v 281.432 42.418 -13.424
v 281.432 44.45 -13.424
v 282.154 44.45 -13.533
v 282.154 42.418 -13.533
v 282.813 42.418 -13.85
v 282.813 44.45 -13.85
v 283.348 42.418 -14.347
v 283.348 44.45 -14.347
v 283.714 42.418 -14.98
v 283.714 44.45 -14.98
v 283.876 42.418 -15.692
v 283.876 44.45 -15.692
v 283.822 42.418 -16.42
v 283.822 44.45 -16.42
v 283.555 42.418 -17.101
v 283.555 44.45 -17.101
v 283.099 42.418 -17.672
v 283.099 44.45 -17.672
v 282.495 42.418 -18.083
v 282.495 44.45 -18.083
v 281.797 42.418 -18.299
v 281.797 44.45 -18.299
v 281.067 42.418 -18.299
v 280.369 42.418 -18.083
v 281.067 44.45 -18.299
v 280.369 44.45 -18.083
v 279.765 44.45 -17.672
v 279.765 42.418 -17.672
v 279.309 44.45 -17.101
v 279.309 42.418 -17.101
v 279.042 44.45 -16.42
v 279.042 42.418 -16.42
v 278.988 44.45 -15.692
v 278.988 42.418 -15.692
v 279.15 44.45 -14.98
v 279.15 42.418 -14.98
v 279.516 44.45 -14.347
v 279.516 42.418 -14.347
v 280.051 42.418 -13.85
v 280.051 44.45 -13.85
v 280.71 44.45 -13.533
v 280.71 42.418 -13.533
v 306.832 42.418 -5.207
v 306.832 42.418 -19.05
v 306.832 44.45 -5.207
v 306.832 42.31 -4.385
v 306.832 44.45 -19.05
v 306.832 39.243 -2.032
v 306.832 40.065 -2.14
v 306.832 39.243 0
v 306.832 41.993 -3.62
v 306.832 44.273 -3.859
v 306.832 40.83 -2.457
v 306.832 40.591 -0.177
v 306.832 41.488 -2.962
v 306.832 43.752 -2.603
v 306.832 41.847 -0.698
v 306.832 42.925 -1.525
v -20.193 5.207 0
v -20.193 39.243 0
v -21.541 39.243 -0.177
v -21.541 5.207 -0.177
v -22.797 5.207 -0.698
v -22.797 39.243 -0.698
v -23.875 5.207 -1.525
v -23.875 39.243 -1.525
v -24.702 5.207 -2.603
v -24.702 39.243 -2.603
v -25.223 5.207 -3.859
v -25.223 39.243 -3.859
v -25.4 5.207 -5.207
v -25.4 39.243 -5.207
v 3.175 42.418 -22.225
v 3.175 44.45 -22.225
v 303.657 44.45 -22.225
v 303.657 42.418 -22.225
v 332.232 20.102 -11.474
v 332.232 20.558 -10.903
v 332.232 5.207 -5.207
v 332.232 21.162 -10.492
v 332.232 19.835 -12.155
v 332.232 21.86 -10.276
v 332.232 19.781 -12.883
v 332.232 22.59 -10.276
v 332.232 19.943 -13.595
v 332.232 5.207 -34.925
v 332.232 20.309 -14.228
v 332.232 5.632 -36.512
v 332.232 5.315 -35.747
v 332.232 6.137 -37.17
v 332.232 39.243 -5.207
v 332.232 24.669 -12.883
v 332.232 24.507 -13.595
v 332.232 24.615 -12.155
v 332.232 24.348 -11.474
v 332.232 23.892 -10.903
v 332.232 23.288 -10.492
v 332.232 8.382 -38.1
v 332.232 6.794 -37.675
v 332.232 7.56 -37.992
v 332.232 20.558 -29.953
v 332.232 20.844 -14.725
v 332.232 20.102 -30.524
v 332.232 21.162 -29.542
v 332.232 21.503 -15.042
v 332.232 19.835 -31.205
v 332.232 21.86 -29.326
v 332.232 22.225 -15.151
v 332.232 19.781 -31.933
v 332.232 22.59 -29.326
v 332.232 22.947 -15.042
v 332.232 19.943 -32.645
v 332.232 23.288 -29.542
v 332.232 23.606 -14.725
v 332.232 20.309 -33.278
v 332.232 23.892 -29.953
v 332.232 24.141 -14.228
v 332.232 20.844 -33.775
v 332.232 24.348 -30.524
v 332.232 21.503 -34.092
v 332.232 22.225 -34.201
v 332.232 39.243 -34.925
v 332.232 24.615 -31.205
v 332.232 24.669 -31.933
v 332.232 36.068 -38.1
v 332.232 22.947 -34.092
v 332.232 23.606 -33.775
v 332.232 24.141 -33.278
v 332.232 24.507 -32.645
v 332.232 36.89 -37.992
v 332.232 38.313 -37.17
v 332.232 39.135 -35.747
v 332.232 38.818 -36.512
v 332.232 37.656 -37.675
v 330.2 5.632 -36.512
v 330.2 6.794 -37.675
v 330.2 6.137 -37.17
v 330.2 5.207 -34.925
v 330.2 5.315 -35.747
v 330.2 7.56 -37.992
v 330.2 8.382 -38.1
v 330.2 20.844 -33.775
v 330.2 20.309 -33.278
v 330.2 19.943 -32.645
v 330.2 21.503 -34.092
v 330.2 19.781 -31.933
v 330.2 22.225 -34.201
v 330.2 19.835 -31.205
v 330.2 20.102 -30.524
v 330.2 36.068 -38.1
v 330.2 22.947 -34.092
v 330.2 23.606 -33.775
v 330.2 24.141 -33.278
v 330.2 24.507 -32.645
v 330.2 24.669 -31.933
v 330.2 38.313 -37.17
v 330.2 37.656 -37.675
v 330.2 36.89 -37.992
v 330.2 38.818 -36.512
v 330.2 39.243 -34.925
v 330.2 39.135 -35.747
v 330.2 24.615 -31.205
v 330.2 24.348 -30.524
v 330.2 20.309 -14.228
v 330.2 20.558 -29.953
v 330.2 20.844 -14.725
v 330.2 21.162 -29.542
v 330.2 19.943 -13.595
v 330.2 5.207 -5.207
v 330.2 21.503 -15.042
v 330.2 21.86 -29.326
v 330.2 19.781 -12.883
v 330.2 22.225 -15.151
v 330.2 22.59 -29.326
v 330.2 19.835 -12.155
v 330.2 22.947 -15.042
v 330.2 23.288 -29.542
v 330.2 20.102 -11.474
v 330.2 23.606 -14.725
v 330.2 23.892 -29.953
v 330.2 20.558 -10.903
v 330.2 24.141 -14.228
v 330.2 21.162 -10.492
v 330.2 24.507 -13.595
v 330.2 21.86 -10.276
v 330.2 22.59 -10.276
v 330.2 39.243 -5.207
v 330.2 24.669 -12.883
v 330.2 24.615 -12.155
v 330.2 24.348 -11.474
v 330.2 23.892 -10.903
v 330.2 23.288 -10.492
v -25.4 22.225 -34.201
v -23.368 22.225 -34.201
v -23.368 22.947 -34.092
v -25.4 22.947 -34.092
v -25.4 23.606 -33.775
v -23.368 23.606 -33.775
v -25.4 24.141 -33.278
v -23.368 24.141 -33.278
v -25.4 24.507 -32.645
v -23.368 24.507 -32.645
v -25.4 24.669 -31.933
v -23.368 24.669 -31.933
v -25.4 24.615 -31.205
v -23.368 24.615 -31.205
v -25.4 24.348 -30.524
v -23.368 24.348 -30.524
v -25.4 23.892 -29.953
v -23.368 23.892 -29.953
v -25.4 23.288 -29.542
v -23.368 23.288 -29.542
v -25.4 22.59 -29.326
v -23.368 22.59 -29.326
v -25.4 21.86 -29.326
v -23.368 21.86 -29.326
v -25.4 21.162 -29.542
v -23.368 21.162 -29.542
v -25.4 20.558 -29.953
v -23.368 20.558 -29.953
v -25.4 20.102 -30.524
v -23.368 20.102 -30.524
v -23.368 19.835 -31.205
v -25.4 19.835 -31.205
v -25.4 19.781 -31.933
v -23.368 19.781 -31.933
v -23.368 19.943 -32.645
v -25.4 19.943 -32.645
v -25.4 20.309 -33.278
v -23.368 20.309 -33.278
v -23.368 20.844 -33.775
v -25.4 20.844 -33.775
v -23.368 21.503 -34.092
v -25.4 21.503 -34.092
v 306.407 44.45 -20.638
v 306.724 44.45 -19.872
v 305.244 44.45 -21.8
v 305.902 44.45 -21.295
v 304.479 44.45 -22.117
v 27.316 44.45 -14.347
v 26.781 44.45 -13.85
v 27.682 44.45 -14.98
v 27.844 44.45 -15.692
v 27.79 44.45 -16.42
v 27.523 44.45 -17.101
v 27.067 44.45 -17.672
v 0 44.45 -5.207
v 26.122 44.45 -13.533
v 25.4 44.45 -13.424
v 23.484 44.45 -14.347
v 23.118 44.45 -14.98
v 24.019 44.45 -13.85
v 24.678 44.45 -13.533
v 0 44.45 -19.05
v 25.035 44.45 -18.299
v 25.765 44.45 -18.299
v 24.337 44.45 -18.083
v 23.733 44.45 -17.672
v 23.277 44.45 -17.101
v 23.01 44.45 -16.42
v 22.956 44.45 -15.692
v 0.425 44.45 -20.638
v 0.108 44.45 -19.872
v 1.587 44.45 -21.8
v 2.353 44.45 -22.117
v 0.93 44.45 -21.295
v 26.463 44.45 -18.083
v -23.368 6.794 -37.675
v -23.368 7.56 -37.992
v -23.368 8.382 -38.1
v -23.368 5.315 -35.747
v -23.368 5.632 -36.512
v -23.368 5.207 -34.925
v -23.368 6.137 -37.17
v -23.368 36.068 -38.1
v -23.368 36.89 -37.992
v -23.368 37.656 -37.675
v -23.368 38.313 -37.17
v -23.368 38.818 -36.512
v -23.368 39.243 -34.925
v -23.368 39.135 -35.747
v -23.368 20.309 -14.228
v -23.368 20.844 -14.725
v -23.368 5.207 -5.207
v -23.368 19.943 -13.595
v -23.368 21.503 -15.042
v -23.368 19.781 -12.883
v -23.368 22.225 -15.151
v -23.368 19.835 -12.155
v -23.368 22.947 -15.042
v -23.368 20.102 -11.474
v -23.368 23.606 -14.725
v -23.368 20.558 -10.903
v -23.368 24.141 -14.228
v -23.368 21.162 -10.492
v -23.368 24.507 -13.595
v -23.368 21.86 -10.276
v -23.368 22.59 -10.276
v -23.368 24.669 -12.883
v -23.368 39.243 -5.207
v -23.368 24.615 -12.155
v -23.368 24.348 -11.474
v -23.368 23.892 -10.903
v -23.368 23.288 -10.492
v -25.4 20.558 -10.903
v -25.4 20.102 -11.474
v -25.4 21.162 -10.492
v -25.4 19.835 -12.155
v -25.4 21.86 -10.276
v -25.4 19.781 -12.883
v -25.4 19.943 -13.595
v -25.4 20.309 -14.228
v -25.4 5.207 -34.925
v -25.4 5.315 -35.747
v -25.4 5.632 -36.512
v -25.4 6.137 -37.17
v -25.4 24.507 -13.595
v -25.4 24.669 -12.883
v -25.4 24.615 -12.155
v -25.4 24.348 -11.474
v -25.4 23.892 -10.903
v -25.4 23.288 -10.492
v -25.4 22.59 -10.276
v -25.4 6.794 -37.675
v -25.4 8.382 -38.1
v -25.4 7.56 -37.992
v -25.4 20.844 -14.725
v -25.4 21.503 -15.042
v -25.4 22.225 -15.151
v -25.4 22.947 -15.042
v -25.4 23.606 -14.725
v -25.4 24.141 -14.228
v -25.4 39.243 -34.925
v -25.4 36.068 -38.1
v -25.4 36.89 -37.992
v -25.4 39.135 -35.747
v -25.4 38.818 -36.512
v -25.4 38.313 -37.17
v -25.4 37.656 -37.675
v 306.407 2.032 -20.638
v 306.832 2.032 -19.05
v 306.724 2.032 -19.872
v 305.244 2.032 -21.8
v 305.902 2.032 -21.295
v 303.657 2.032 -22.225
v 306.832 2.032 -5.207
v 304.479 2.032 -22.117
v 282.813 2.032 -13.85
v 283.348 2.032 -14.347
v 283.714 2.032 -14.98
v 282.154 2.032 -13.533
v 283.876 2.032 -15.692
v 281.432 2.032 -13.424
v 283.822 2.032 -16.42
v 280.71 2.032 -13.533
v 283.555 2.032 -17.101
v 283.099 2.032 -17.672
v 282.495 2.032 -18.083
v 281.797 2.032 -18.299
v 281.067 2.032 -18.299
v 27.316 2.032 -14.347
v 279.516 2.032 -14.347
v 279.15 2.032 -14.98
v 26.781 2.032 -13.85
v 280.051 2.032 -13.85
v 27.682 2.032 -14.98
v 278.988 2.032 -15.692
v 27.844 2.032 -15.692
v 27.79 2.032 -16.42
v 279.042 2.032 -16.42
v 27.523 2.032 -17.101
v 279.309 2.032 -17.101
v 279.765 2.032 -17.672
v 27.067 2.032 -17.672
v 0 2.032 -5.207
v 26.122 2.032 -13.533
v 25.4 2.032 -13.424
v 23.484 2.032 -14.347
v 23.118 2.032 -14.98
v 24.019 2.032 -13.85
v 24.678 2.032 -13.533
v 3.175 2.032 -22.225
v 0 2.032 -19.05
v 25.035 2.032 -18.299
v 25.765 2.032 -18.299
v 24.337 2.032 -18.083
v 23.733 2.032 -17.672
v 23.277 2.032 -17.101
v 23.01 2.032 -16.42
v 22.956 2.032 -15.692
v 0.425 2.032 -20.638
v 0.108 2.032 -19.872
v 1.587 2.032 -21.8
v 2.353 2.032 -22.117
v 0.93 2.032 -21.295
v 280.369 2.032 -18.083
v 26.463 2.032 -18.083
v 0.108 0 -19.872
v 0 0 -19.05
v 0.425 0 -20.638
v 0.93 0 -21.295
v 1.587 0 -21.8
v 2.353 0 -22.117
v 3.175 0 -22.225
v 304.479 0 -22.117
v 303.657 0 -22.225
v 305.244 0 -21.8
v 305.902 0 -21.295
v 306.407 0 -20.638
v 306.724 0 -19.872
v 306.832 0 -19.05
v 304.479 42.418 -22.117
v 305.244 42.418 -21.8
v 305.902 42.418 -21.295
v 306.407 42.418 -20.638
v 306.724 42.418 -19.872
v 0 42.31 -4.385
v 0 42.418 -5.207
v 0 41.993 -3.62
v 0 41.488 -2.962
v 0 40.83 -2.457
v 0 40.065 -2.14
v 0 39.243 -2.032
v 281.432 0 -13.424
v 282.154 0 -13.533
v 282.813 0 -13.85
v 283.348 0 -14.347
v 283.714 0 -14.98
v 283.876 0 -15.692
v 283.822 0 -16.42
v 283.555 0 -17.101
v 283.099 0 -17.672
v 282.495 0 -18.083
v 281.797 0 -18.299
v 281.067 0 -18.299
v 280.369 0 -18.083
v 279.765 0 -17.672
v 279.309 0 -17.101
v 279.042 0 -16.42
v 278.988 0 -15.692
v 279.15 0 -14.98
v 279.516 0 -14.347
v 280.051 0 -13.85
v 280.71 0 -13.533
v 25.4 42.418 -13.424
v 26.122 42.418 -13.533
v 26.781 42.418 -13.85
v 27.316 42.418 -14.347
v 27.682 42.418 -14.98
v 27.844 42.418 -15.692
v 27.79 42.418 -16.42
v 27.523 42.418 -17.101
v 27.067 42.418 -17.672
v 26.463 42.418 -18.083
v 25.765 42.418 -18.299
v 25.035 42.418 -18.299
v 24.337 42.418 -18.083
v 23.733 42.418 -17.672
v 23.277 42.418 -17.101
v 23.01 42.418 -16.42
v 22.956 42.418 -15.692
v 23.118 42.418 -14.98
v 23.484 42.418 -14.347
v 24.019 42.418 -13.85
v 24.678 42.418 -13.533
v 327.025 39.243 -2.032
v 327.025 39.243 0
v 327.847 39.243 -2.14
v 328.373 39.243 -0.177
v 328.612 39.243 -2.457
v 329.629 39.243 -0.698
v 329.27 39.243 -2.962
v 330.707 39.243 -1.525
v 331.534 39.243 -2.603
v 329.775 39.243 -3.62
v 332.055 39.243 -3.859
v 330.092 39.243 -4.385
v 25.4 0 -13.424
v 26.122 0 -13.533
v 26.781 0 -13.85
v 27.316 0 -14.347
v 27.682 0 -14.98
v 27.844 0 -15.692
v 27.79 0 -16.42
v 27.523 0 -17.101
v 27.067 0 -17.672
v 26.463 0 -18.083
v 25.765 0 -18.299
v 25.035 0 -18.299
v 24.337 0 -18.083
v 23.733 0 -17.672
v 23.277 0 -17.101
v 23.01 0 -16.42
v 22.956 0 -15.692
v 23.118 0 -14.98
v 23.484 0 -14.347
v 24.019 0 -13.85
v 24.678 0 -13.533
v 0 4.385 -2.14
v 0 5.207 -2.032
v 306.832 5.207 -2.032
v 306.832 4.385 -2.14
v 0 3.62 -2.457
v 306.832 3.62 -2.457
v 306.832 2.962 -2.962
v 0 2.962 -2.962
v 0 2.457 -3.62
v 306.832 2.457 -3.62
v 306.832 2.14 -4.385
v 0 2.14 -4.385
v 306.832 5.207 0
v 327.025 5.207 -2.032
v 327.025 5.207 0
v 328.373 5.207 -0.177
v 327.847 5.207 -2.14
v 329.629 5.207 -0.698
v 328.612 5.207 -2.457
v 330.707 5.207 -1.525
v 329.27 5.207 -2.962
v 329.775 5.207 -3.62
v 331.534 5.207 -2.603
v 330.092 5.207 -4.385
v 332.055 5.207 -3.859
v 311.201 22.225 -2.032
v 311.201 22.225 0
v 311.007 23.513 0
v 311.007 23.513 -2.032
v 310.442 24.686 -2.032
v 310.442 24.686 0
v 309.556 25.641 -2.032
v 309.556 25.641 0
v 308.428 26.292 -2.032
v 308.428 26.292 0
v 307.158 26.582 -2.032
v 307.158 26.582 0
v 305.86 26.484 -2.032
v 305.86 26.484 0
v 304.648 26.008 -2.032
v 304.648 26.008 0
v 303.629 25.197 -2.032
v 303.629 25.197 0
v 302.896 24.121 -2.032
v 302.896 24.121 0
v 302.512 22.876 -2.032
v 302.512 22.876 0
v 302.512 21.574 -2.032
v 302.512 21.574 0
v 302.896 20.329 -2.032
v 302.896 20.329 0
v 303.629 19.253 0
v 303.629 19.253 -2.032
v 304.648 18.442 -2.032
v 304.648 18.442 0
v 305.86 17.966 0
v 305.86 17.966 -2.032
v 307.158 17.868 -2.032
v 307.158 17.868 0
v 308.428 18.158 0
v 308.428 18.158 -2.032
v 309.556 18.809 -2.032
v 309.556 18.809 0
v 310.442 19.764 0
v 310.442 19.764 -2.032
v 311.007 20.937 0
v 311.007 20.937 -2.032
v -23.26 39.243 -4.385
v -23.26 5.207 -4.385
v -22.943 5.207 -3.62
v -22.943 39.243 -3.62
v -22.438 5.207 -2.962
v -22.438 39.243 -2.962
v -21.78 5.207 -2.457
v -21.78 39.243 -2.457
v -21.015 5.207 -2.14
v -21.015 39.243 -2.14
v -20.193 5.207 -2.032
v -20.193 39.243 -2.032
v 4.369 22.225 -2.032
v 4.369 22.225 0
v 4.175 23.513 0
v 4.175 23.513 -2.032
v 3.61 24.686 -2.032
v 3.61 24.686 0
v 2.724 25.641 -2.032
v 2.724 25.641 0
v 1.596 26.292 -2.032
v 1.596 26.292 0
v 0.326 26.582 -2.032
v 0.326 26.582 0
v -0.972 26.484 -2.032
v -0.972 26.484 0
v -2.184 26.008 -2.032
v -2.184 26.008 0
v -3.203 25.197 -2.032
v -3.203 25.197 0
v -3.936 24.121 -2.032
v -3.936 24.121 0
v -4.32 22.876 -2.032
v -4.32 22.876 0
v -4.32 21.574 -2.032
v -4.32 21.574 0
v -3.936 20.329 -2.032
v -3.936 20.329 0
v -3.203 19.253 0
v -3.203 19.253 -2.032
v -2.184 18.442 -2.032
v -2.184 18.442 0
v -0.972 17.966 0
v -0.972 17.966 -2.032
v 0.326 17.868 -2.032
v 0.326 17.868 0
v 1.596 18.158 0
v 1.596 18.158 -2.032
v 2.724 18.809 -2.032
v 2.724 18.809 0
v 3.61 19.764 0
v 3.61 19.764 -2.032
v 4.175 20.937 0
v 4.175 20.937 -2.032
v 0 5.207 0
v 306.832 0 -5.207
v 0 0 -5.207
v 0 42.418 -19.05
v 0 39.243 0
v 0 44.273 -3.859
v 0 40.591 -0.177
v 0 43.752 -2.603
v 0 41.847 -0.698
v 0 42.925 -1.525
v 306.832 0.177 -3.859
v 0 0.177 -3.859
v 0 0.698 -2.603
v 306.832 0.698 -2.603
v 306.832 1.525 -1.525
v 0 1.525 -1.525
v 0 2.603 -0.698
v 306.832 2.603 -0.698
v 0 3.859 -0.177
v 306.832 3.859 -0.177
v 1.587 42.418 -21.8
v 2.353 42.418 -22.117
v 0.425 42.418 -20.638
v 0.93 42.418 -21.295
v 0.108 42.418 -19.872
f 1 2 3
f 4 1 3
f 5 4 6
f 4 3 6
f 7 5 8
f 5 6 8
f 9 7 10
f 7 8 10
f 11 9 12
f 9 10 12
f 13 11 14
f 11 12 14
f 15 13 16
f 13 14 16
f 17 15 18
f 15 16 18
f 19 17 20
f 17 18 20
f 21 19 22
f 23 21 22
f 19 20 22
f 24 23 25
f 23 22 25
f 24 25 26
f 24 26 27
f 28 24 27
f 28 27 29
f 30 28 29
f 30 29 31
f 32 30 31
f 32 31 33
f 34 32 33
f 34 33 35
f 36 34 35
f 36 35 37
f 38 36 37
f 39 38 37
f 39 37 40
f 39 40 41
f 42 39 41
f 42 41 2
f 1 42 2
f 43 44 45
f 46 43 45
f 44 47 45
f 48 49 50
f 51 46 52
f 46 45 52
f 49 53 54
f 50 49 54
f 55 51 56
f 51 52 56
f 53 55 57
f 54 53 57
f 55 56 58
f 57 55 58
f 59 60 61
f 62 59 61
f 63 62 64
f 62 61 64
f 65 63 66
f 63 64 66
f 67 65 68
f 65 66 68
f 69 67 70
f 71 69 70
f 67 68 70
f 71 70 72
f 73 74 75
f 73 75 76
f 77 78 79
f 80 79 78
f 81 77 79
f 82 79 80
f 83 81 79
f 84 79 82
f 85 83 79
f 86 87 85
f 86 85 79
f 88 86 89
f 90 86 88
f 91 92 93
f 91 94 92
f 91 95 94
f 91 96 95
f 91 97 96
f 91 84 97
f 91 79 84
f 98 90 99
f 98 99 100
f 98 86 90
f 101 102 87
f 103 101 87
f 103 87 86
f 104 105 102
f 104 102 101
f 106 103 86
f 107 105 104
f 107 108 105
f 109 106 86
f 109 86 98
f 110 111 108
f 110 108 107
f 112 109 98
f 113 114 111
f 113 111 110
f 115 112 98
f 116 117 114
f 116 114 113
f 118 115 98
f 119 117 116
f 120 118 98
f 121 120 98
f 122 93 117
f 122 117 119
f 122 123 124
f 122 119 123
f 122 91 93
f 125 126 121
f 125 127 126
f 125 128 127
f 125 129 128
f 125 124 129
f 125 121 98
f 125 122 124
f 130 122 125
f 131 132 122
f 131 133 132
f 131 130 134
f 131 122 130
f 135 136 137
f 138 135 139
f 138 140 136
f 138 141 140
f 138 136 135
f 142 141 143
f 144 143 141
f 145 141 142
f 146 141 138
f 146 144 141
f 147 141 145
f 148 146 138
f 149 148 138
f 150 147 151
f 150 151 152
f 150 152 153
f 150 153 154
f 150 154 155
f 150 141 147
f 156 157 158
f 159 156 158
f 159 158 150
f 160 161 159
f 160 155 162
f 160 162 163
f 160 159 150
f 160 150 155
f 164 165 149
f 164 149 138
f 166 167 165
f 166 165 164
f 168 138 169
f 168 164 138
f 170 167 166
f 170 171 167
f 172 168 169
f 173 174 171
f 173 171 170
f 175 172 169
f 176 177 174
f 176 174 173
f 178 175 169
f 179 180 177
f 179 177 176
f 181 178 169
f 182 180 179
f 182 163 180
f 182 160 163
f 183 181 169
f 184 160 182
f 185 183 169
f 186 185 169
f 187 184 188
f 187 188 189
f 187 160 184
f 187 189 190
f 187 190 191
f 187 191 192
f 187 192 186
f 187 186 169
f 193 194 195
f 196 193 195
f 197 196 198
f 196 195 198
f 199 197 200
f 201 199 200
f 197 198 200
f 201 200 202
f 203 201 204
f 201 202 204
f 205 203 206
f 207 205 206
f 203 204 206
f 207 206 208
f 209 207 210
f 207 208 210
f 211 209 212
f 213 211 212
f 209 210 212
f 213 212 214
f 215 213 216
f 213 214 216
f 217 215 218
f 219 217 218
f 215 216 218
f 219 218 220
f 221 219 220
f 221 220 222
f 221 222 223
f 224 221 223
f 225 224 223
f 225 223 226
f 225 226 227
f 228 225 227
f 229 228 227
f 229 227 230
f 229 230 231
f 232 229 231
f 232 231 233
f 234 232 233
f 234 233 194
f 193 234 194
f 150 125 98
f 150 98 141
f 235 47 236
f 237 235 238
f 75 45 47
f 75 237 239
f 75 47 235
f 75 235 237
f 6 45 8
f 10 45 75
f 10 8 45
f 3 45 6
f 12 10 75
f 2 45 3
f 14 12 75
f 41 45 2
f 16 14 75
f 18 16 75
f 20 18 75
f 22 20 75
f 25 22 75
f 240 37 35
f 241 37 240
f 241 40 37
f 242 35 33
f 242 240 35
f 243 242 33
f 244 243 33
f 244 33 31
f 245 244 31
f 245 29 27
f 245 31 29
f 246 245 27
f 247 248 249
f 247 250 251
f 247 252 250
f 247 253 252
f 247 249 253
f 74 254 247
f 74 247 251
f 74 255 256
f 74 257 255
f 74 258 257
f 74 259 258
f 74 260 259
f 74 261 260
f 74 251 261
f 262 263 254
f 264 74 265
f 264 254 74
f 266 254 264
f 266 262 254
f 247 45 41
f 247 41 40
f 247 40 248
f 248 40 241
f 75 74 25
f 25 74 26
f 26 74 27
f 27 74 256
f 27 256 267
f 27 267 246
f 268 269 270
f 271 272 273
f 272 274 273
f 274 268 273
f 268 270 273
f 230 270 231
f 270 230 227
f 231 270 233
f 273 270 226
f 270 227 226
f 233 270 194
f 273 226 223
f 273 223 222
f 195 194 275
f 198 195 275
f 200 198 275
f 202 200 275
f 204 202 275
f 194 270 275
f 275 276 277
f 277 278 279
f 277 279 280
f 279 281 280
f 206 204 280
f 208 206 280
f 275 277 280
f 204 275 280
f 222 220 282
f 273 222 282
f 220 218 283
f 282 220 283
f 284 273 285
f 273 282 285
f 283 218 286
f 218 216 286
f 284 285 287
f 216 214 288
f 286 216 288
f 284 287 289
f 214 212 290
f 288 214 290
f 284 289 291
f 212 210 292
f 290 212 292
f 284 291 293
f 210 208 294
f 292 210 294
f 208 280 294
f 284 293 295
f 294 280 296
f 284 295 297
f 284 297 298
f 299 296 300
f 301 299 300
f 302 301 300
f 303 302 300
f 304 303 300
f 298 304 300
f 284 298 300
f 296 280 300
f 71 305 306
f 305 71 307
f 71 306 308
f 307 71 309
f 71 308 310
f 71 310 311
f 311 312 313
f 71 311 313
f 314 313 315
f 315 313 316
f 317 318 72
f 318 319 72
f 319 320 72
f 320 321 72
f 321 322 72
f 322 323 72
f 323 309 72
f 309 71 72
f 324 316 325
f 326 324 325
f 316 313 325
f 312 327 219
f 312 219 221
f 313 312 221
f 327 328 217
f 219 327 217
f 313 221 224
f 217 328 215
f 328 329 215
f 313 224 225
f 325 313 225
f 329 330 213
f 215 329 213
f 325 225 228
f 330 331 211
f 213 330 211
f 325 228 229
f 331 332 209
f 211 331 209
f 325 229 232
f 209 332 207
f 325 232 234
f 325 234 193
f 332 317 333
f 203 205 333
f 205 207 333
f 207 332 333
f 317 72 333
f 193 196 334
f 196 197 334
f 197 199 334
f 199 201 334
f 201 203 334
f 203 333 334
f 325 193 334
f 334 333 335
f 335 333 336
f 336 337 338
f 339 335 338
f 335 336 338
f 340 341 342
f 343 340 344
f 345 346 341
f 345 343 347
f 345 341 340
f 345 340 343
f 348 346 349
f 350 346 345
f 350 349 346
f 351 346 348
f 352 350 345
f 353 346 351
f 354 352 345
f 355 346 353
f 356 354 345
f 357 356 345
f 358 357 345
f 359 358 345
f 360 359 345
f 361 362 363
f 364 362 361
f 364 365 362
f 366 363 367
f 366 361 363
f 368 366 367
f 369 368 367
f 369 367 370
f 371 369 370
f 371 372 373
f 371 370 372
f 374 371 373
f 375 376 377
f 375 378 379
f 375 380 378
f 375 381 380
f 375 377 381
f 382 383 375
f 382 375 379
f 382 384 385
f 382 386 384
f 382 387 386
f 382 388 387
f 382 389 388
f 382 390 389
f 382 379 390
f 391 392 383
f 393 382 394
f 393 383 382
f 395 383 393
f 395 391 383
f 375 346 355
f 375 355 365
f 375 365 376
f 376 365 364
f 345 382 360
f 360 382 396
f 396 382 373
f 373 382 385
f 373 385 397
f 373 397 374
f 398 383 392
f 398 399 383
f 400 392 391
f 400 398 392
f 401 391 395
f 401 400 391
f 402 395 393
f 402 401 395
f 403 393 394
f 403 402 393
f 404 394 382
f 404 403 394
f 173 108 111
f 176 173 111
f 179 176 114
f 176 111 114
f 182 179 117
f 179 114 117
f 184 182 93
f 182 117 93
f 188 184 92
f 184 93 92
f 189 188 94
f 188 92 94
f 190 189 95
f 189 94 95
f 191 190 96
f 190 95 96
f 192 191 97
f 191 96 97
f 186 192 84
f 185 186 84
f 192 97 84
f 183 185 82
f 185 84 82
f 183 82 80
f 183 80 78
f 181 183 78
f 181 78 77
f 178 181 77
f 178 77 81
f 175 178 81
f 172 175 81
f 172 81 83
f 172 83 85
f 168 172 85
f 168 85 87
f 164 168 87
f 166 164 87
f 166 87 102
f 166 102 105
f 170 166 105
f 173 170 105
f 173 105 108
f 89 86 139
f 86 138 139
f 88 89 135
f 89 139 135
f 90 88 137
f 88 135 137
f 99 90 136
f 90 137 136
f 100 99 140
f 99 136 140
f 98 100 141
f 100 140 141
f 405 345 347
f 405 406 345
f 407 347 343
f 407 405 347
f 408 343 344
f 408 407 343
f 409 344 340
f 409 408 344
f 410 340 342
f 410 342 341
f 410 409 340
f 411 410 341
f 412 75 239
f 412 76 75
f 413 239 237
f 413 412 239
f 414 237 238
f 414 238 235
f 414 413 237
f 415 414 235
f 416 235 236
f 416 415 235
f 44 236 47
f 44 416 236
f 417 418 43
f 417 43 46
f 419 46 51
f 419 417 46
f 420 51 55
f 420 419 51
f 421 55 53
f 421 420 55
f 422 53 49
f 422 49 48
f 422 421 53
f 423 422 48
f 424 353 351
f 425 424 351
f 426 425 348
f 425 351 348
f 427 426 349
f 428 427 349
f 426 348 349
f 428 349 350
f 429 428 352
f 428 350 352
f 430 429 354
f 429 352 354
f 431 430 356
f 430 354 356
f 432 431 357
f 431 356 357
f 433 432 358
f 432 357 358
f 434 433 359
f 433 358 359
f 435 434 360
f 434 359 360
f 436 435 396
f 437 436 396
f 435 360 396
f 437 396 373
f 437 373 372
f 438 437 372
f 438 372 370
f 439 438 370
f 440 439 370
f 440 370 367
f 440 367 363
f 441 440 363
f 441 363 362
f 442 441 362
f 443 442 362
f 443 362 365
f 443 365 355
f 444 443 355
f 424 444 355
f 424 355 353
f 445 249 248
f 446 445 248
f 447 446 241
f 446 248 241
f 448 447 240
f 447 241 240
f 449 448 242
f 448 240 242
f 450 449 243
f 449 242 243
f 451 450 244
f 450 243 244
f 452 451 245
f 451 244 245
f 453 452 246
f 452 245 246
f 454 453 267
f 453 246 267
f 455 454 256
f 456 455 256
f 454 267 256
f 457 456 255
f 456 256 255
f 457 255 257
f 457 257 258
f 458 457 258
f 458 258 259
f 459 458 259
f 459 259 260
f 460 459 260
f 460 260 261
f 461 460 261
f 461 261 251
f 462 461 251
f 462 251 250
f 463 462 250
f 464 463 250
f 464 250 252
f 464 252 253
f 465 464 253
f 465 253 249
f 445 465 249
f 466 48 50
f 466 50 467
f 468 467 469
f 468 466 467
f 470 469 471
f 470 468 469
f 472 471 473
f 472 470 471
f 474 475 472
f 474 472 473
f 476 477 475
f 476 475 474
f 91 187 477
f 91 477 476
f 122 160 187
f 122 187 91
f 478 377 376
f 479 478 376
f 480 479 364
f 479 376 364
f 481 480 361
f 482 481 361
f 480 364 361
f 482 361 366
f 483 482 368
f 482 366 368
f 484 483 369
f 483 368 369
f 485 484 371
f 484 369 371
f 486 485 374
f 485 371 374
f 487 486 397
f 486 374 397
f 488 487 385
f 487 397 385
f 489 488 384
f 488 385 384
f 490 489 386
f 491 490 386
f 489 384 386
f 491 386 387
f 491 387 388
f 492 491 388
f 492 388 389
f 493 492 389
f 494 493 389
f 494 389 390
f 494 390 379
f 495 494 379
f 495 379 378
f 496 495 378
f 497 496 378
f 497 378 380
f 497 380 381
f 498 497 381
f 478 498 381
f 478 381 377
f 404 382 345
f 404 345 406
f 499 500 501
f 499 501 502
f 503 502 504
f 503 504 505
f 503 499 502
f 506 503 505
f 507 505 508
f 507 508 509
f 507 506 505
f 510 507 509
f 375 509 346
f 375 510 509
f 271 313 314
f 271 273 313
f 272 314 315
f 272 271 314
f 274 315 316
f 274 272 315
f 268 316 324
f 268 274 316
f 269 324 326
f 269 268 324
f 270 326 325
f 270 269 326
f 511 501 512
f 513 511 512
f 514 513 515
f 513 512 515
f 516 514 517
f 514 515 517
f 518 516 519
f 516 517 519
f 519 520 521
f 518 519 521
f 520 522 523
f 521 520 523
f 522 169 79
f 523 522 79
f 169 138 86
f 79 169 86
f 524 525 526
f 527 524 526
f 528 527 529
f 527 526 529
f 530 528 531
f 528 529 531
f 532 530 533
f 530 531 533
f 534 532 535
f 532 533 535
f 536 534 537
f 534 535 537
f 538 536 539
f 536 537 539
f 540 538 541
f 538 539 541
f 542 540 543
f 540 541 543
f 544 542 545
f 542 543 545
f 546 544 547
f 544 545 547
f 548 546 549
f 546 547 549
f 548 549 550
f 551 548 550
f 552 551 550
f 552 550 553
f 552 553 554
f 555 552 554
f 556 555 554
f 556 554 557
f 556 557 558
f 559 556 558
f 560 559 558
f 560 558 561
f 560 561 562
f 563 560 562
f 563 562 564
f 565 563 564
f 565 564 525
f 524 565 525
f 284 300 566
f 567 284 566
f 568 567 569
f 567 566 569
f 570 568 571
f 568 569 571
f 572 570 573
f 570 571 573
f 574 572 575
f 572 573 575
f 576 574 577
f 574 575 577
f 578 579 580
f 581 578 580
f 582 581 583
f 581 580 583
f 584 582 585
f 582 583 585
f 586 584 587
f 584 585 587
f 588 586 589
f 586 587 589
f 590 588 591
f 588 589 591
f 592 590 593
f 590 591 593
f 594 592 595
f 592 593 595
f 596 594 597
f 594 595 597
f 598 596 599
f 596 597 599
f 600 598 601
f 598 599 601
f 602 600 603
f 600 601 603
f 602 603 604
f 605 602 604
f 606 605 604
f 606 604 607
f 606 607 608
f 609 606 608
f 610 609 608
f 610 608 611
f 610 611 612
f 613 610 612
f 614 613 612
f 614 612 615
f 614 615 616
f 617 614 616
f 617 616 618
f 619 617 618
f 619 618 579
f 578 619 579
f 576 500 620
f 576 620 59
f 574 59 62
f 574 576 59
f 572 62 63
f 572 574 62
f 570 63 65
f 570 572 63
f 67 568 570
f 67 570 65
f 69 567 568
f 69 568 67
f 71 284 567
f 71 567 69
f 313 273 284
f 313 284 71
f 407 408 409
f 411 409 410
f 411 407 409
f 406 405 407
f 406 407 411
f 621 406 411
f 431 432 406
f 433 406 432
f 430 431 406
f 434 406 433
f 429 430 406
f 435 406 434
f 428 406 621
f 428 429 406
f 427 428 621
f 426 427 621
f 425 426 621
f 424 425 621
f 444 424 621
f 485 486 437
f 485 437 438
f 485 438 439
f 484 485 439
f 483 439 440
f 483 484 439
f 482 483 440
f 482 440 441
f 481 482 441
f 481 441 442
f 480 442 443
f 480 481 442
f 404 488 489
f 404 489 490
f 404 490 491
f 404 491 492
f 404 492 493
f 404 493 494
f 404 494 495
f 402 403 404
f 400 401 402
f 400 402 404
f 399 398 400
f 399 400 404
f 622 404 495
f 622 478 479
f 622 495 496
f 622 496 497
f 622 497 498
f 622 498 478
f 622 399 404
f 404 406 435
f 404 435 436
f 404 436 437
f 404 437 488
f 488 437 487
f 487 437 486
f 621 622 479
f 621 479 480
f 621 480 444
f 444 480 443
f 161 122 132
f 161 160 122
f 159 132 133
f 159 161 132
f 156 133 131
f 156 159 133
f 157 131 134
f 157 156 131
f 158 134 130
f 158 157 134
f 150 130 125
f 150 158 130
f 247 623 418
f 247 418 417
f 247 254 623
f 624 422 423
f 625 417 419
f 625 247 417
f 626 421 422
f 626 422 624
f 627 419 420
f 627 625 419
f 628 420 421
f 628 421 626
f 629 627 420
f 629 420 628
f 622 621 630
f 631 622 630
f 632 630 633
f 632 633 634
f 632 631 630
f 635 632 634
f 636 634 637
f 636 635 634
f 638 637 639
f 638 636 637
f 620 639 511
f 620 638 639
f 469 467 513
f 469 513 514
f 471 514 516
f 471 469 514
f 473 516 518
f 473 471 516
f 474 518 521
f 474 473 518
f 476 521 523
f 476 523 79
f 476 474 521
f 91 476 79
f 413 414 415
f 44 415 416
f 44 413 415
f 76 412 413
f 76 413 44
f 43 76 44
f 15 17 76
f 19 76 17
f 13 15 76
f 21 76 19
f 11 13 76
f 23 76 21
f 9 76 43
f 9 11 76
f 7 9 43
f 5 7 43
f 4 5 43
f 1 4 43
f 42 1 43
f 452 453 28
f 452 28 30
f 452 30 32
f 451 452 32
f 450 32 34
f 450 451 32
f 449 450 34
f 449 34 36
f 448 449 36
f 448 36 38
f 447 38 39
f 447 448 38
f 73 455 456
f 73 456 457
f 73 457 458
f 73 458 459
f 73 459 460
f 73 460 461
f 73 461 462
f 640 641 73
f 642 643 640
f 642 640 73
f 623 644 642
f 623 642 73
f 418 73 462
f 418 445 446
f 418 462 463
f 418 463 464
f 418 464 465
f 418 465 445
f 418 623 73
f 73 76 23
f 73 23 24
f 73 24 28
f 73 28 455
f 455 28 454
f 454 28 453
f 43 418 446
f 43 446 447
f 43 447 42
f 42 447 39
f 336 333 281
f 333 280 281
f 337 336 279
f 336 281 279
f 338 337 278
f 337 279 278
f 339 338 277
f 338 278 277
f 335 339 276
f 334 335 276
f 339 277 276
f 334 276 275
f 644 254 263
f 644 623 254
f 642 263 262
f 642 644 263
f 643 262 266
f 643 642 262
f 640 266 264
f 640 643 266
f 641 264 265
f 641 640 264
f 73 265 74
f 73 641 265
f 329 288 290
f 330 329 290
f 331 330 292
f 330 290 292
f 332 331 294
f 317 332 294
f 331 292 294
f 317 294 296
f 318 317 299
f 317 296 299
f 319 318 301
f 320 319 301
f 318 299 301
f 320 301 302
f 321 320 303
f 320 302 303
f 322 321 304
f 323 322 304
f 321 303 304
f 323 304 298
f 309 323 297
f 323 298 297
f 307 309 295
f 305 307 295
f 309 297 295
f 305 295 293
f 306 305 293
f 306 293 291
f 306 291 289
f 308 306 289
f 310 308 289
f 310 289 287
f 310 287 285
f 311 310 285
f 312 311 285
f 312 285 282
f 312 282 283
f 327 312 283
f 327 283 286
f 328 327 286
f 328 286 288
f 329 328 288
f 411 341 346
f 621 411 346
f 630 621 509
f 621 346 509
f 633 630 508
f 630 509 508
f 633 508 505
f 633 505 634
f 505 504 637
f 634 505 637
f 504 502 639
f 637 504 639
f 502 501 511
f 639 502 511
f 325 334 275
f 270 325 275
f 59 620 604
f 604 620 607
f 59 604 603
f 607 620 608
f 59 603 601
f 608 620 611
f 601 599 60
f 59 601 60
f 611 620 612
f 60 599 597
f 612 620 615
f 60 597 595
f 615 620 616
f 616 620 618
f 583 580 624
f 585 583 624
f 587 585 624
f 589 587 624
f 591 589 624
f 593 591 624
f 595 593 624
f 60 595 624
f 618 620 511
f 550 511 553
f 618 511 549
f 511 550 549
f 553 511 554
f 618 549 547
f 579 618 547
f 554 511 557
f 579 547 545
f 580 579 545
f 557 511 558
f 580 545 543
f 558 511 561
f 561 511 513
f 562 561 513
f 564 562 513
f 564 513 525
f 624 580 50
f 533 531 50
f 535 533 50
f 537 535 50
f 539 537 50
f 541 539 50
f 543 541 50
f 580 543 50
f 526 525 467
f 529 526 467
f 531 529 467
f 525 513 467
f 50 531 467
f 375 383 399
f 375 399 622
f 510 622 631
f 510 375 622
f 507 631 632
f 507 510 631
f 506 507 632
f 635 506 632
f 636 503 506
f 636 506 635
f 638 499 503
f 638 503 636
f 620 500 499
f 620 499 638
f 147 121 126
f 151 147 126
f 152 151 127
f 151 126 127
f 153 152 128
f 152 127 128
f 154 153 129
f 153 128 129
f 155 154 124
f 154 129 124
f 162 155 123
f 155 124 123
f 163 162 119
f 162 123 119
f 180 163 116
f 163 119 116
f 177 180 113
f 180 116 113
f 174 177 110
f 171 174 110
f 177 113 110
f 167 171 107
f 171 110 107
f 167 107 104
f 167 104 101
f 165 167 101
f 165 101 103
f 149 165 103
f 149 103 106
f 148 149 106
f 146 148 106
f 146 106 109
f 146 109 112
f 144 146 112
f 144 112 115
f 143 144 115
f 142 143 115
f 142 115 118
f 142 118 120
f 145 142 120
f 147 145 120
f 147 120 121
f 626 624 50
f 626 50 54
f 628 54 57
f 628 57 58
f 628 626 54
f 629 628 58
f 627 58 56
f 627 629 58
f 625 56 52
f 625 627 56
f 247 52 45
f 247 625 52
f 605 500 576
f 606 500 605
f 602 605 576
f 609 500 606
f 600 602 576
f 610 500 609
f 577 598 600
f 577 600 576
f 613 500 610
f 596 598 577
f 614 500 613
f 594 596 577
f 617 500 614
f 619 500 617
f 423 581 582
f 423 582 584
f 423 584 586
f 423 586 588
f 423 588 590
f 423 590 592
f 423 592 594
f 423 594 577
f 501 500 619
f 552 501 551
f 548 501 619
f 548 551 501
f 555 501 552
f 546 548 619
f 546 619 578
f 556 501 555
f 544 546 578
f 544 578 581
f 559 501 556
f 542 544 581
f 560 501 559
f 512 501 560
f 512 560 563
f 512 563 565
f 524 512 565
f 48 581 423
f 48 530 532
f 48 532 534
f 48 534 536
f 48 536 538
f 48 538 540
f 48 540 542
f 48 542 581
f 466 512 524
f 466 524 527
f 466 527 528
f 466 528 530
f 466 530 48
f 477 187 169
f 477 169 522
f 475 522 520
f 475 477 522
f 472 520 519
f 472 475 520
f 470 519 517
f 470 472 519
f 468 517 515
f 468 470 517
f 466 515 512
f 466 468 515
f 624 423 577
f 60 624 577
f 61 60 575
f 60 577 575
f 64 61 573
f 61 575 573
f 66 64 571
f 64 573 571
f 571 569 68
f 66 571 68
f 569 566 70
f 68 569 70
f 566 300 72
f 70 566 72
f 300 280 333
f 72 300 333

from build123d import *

# Parameters (mm, degrees)
BASE_FLANGE1_DEPTH           = 306.832
SKETCH2_W                    = 2.032
SKETCH2_H                    = 34.036
BOSS_EXTRUDE1_DEPTH          = 25.4
EDGE_FLANGE1_STRIP_W         = 14.478
EDGE_FLANGE1_STRIP_H         = 2.032
EDGE_FLANGE1_STRIP_CUT_DEPTH = 34.036
EDGE_FLANGE1_DEPTH           = 34.036
SKETCH6_R                    = 2.4511
CUT_EXTRUDE1_DEPTH           = 338.350728951
SKETCH7_R                    = 4.3688
CUT_EXTRUDE2_DEPTH           = 338.350728951
SKETCH8_R                    = 2.4511
CUT_EXTRUDE3_DEPTH           = 363.392135571
FILLET1_R                    = 3.175


# Sheet-metal steps are written as plain solids
with BuildPart() as part:
    # Sketch1 → Base-Flange1 (new body)
    with BuildSketch(Plane(origin=(0, 0, 0), x_dir=(0, 0, -1), z_dir=(1, 0, 0))):
        with BuildLine():
            Line((22.225, 0), (5.207, 0))
            ThreePointArc((5.207, 0), (1.52509499, 1.52509499), (0, 5.207))
            Line((0, 5.207), (0, 39.243))
            ThreePointArc((0, 39.243), (1.52509499, 42.92490501), (5.207, 44.45))
            Line((5.207, 44.45), (22.225, 44.45))
            Line((22.225, 44.45), (22.225, 42.418))
            Line((22.225, 42.418), (5.207, 42.418))
            ThreePointArc((5.207, 42.418), (2.96193597, 41.48806403), (2.032, 39.243))
            Line((2.032, 39.243), (2.032, 5.207))
            ThreePointArc((2.032, 5.207), (2.96193597, 2.96193597), (5.207, 2.032))
            Line((5.207, 2.032), (22.225, 2.032))
            Line((22.225, 2.032), (22.225, 0))
        make_face()
    extrude(amount=BASE_FLANGE1_DEPTH)

    # Sketch2 → Boss-Extrude1 (add)
    with BuildSketch(Plane(origin=(306.832, 0, 0), x_dir=(0, 0, -1), z_dir=(1, 0, 0))):
        with Locations((1.016, 22.225)):
            Rectangle(SKETCH2_W, SKETCH2_H)
    boss_extrude1 = extrude(amount=BOSS_EXTRUDE1_DEPTH)

    # Edge-Flange1 strip (across the edge) → Edge-Flange1 strip cut (cut)
    with BuildSketch(Plane(origin=(332.232, 39.243, -2.032), x_dir=(-1, 0, 0), z_dir=(0, -1, 0))):
        with Locations((-2.032, -1.016)):
            Rectangle(EDGE_FLANGE1_STRIP_W, EDGE_FLANGE1_STRIP_H)
    edge_flange1_strip_cut = extrude(amount=EDGE_FLANGE1_STRIP_CUT_DEPTH, mode=Mode.SUBTRACT)

    # Edge-Flange1 section (across the edge) → Edge-Flange1 (add)
    with BuildSketch(Plane(origin=(332.232, 39.243, -2.032), x_dir=(-1, 0, 0), z_dir=(0, -1, 0))):
        with BuildLine():
            Line((0, 3.175), (0, 36.068))
            Line((0, 36.068), (2.032, 36.068))
            Line((2.032, 36.068), (2.032, 3.175))
            ThreePointArc((2.032, 3.175), (2.96193597, 0.92993597), (5.207, 0))
            Line((5.207, 0), (5.207, -2.032))
            ThreePointArc((5.207, -2.032), (1.52509499, -0.50690501), (0, 3.175))
        make_face()
    edge_flange1 = extrude(amount=EDGE_FLANGE1_DEPTH)

    # Mirror1: Boss-Extrude1, Edge-Flange1 strip cut, Edge-Flange1 across plane
    add(boss_extrude1.mirror(Plane.ZY.offset(-153.416)))
    add(edge_flange1_strip_cut.mirror(Plane.ZY.offset(-153.416)), mode=Mode.SUBTRACT)
    add(edge_flange1.mirror(Plane.ZY.offset(-153.416)))

    # Sketch6 → Cut-Extrude1 (cut, through all)
    with BuildSketch(Plane(origin=(0, 44.45, 0), x_dir=(1, 0, 0), z_dir=(0, 1, 0))):
        with Locations(Location((25.4, 15.875, 0), (0, 0, 270))):
            Circle(SKETCH6_R)
        with Locations(Location((281.432, 15.875, 0), (0, 0, 270))):
            Circle(SKETCH6_R)
    extrude(amount=-CUT_EXTRUDE1_DEPTH, mode=Mode.SUBTRACT)

    # Sketch7 → Cut-Extrude2 (cut, through all)
    with BuildSketch(Plane.XY):
        with Locations((0, 22.225)):
            Circle(SKETCH7_R)
        with Locations((306.832, 22.225)):
            Circle(SKETCH7_R)
    extrude(amount=-CUT_EXTRUDE2_DEPTH, mode=Mode.SUBTRACT)

    # Sketch8 → Cut-Extrude3 (cut, through all)
    with BuildSketch(Plane(origin=(332.232, 0, 0), x_dir=(0, 0, -1), z_dir=(1, 0, 0))):
        with Locations((31.75, 22.225)):
            Circle(SKETCH8_R)
        with Locations((12.7, 22.225)):
            Circle(SKETCH8_R)
    extrude(amount=-CUT_EXTRUDE3_DEPTH, mode=Mode.SUBTRACT)

    # Fillet1
    fillet1_edges = [part.edges().sort_by_distance(p)[0] for p in [
        (-24.384, 5.207, -38.1),
        (0, 1.016, -22.225),
        (-24.384, 39.243, -38.1),
        (0, 43.434, -22.225),
        (306.832, 1.016, -22.225),
        (331.216, 39.243, -38.1),
        (331.216, 5.207, -38.1),
        (306.832, 43.434, -22.225),
    ]]
    fillet(fillet1_edges, radius=FILLET1_R)


solid = part.part
